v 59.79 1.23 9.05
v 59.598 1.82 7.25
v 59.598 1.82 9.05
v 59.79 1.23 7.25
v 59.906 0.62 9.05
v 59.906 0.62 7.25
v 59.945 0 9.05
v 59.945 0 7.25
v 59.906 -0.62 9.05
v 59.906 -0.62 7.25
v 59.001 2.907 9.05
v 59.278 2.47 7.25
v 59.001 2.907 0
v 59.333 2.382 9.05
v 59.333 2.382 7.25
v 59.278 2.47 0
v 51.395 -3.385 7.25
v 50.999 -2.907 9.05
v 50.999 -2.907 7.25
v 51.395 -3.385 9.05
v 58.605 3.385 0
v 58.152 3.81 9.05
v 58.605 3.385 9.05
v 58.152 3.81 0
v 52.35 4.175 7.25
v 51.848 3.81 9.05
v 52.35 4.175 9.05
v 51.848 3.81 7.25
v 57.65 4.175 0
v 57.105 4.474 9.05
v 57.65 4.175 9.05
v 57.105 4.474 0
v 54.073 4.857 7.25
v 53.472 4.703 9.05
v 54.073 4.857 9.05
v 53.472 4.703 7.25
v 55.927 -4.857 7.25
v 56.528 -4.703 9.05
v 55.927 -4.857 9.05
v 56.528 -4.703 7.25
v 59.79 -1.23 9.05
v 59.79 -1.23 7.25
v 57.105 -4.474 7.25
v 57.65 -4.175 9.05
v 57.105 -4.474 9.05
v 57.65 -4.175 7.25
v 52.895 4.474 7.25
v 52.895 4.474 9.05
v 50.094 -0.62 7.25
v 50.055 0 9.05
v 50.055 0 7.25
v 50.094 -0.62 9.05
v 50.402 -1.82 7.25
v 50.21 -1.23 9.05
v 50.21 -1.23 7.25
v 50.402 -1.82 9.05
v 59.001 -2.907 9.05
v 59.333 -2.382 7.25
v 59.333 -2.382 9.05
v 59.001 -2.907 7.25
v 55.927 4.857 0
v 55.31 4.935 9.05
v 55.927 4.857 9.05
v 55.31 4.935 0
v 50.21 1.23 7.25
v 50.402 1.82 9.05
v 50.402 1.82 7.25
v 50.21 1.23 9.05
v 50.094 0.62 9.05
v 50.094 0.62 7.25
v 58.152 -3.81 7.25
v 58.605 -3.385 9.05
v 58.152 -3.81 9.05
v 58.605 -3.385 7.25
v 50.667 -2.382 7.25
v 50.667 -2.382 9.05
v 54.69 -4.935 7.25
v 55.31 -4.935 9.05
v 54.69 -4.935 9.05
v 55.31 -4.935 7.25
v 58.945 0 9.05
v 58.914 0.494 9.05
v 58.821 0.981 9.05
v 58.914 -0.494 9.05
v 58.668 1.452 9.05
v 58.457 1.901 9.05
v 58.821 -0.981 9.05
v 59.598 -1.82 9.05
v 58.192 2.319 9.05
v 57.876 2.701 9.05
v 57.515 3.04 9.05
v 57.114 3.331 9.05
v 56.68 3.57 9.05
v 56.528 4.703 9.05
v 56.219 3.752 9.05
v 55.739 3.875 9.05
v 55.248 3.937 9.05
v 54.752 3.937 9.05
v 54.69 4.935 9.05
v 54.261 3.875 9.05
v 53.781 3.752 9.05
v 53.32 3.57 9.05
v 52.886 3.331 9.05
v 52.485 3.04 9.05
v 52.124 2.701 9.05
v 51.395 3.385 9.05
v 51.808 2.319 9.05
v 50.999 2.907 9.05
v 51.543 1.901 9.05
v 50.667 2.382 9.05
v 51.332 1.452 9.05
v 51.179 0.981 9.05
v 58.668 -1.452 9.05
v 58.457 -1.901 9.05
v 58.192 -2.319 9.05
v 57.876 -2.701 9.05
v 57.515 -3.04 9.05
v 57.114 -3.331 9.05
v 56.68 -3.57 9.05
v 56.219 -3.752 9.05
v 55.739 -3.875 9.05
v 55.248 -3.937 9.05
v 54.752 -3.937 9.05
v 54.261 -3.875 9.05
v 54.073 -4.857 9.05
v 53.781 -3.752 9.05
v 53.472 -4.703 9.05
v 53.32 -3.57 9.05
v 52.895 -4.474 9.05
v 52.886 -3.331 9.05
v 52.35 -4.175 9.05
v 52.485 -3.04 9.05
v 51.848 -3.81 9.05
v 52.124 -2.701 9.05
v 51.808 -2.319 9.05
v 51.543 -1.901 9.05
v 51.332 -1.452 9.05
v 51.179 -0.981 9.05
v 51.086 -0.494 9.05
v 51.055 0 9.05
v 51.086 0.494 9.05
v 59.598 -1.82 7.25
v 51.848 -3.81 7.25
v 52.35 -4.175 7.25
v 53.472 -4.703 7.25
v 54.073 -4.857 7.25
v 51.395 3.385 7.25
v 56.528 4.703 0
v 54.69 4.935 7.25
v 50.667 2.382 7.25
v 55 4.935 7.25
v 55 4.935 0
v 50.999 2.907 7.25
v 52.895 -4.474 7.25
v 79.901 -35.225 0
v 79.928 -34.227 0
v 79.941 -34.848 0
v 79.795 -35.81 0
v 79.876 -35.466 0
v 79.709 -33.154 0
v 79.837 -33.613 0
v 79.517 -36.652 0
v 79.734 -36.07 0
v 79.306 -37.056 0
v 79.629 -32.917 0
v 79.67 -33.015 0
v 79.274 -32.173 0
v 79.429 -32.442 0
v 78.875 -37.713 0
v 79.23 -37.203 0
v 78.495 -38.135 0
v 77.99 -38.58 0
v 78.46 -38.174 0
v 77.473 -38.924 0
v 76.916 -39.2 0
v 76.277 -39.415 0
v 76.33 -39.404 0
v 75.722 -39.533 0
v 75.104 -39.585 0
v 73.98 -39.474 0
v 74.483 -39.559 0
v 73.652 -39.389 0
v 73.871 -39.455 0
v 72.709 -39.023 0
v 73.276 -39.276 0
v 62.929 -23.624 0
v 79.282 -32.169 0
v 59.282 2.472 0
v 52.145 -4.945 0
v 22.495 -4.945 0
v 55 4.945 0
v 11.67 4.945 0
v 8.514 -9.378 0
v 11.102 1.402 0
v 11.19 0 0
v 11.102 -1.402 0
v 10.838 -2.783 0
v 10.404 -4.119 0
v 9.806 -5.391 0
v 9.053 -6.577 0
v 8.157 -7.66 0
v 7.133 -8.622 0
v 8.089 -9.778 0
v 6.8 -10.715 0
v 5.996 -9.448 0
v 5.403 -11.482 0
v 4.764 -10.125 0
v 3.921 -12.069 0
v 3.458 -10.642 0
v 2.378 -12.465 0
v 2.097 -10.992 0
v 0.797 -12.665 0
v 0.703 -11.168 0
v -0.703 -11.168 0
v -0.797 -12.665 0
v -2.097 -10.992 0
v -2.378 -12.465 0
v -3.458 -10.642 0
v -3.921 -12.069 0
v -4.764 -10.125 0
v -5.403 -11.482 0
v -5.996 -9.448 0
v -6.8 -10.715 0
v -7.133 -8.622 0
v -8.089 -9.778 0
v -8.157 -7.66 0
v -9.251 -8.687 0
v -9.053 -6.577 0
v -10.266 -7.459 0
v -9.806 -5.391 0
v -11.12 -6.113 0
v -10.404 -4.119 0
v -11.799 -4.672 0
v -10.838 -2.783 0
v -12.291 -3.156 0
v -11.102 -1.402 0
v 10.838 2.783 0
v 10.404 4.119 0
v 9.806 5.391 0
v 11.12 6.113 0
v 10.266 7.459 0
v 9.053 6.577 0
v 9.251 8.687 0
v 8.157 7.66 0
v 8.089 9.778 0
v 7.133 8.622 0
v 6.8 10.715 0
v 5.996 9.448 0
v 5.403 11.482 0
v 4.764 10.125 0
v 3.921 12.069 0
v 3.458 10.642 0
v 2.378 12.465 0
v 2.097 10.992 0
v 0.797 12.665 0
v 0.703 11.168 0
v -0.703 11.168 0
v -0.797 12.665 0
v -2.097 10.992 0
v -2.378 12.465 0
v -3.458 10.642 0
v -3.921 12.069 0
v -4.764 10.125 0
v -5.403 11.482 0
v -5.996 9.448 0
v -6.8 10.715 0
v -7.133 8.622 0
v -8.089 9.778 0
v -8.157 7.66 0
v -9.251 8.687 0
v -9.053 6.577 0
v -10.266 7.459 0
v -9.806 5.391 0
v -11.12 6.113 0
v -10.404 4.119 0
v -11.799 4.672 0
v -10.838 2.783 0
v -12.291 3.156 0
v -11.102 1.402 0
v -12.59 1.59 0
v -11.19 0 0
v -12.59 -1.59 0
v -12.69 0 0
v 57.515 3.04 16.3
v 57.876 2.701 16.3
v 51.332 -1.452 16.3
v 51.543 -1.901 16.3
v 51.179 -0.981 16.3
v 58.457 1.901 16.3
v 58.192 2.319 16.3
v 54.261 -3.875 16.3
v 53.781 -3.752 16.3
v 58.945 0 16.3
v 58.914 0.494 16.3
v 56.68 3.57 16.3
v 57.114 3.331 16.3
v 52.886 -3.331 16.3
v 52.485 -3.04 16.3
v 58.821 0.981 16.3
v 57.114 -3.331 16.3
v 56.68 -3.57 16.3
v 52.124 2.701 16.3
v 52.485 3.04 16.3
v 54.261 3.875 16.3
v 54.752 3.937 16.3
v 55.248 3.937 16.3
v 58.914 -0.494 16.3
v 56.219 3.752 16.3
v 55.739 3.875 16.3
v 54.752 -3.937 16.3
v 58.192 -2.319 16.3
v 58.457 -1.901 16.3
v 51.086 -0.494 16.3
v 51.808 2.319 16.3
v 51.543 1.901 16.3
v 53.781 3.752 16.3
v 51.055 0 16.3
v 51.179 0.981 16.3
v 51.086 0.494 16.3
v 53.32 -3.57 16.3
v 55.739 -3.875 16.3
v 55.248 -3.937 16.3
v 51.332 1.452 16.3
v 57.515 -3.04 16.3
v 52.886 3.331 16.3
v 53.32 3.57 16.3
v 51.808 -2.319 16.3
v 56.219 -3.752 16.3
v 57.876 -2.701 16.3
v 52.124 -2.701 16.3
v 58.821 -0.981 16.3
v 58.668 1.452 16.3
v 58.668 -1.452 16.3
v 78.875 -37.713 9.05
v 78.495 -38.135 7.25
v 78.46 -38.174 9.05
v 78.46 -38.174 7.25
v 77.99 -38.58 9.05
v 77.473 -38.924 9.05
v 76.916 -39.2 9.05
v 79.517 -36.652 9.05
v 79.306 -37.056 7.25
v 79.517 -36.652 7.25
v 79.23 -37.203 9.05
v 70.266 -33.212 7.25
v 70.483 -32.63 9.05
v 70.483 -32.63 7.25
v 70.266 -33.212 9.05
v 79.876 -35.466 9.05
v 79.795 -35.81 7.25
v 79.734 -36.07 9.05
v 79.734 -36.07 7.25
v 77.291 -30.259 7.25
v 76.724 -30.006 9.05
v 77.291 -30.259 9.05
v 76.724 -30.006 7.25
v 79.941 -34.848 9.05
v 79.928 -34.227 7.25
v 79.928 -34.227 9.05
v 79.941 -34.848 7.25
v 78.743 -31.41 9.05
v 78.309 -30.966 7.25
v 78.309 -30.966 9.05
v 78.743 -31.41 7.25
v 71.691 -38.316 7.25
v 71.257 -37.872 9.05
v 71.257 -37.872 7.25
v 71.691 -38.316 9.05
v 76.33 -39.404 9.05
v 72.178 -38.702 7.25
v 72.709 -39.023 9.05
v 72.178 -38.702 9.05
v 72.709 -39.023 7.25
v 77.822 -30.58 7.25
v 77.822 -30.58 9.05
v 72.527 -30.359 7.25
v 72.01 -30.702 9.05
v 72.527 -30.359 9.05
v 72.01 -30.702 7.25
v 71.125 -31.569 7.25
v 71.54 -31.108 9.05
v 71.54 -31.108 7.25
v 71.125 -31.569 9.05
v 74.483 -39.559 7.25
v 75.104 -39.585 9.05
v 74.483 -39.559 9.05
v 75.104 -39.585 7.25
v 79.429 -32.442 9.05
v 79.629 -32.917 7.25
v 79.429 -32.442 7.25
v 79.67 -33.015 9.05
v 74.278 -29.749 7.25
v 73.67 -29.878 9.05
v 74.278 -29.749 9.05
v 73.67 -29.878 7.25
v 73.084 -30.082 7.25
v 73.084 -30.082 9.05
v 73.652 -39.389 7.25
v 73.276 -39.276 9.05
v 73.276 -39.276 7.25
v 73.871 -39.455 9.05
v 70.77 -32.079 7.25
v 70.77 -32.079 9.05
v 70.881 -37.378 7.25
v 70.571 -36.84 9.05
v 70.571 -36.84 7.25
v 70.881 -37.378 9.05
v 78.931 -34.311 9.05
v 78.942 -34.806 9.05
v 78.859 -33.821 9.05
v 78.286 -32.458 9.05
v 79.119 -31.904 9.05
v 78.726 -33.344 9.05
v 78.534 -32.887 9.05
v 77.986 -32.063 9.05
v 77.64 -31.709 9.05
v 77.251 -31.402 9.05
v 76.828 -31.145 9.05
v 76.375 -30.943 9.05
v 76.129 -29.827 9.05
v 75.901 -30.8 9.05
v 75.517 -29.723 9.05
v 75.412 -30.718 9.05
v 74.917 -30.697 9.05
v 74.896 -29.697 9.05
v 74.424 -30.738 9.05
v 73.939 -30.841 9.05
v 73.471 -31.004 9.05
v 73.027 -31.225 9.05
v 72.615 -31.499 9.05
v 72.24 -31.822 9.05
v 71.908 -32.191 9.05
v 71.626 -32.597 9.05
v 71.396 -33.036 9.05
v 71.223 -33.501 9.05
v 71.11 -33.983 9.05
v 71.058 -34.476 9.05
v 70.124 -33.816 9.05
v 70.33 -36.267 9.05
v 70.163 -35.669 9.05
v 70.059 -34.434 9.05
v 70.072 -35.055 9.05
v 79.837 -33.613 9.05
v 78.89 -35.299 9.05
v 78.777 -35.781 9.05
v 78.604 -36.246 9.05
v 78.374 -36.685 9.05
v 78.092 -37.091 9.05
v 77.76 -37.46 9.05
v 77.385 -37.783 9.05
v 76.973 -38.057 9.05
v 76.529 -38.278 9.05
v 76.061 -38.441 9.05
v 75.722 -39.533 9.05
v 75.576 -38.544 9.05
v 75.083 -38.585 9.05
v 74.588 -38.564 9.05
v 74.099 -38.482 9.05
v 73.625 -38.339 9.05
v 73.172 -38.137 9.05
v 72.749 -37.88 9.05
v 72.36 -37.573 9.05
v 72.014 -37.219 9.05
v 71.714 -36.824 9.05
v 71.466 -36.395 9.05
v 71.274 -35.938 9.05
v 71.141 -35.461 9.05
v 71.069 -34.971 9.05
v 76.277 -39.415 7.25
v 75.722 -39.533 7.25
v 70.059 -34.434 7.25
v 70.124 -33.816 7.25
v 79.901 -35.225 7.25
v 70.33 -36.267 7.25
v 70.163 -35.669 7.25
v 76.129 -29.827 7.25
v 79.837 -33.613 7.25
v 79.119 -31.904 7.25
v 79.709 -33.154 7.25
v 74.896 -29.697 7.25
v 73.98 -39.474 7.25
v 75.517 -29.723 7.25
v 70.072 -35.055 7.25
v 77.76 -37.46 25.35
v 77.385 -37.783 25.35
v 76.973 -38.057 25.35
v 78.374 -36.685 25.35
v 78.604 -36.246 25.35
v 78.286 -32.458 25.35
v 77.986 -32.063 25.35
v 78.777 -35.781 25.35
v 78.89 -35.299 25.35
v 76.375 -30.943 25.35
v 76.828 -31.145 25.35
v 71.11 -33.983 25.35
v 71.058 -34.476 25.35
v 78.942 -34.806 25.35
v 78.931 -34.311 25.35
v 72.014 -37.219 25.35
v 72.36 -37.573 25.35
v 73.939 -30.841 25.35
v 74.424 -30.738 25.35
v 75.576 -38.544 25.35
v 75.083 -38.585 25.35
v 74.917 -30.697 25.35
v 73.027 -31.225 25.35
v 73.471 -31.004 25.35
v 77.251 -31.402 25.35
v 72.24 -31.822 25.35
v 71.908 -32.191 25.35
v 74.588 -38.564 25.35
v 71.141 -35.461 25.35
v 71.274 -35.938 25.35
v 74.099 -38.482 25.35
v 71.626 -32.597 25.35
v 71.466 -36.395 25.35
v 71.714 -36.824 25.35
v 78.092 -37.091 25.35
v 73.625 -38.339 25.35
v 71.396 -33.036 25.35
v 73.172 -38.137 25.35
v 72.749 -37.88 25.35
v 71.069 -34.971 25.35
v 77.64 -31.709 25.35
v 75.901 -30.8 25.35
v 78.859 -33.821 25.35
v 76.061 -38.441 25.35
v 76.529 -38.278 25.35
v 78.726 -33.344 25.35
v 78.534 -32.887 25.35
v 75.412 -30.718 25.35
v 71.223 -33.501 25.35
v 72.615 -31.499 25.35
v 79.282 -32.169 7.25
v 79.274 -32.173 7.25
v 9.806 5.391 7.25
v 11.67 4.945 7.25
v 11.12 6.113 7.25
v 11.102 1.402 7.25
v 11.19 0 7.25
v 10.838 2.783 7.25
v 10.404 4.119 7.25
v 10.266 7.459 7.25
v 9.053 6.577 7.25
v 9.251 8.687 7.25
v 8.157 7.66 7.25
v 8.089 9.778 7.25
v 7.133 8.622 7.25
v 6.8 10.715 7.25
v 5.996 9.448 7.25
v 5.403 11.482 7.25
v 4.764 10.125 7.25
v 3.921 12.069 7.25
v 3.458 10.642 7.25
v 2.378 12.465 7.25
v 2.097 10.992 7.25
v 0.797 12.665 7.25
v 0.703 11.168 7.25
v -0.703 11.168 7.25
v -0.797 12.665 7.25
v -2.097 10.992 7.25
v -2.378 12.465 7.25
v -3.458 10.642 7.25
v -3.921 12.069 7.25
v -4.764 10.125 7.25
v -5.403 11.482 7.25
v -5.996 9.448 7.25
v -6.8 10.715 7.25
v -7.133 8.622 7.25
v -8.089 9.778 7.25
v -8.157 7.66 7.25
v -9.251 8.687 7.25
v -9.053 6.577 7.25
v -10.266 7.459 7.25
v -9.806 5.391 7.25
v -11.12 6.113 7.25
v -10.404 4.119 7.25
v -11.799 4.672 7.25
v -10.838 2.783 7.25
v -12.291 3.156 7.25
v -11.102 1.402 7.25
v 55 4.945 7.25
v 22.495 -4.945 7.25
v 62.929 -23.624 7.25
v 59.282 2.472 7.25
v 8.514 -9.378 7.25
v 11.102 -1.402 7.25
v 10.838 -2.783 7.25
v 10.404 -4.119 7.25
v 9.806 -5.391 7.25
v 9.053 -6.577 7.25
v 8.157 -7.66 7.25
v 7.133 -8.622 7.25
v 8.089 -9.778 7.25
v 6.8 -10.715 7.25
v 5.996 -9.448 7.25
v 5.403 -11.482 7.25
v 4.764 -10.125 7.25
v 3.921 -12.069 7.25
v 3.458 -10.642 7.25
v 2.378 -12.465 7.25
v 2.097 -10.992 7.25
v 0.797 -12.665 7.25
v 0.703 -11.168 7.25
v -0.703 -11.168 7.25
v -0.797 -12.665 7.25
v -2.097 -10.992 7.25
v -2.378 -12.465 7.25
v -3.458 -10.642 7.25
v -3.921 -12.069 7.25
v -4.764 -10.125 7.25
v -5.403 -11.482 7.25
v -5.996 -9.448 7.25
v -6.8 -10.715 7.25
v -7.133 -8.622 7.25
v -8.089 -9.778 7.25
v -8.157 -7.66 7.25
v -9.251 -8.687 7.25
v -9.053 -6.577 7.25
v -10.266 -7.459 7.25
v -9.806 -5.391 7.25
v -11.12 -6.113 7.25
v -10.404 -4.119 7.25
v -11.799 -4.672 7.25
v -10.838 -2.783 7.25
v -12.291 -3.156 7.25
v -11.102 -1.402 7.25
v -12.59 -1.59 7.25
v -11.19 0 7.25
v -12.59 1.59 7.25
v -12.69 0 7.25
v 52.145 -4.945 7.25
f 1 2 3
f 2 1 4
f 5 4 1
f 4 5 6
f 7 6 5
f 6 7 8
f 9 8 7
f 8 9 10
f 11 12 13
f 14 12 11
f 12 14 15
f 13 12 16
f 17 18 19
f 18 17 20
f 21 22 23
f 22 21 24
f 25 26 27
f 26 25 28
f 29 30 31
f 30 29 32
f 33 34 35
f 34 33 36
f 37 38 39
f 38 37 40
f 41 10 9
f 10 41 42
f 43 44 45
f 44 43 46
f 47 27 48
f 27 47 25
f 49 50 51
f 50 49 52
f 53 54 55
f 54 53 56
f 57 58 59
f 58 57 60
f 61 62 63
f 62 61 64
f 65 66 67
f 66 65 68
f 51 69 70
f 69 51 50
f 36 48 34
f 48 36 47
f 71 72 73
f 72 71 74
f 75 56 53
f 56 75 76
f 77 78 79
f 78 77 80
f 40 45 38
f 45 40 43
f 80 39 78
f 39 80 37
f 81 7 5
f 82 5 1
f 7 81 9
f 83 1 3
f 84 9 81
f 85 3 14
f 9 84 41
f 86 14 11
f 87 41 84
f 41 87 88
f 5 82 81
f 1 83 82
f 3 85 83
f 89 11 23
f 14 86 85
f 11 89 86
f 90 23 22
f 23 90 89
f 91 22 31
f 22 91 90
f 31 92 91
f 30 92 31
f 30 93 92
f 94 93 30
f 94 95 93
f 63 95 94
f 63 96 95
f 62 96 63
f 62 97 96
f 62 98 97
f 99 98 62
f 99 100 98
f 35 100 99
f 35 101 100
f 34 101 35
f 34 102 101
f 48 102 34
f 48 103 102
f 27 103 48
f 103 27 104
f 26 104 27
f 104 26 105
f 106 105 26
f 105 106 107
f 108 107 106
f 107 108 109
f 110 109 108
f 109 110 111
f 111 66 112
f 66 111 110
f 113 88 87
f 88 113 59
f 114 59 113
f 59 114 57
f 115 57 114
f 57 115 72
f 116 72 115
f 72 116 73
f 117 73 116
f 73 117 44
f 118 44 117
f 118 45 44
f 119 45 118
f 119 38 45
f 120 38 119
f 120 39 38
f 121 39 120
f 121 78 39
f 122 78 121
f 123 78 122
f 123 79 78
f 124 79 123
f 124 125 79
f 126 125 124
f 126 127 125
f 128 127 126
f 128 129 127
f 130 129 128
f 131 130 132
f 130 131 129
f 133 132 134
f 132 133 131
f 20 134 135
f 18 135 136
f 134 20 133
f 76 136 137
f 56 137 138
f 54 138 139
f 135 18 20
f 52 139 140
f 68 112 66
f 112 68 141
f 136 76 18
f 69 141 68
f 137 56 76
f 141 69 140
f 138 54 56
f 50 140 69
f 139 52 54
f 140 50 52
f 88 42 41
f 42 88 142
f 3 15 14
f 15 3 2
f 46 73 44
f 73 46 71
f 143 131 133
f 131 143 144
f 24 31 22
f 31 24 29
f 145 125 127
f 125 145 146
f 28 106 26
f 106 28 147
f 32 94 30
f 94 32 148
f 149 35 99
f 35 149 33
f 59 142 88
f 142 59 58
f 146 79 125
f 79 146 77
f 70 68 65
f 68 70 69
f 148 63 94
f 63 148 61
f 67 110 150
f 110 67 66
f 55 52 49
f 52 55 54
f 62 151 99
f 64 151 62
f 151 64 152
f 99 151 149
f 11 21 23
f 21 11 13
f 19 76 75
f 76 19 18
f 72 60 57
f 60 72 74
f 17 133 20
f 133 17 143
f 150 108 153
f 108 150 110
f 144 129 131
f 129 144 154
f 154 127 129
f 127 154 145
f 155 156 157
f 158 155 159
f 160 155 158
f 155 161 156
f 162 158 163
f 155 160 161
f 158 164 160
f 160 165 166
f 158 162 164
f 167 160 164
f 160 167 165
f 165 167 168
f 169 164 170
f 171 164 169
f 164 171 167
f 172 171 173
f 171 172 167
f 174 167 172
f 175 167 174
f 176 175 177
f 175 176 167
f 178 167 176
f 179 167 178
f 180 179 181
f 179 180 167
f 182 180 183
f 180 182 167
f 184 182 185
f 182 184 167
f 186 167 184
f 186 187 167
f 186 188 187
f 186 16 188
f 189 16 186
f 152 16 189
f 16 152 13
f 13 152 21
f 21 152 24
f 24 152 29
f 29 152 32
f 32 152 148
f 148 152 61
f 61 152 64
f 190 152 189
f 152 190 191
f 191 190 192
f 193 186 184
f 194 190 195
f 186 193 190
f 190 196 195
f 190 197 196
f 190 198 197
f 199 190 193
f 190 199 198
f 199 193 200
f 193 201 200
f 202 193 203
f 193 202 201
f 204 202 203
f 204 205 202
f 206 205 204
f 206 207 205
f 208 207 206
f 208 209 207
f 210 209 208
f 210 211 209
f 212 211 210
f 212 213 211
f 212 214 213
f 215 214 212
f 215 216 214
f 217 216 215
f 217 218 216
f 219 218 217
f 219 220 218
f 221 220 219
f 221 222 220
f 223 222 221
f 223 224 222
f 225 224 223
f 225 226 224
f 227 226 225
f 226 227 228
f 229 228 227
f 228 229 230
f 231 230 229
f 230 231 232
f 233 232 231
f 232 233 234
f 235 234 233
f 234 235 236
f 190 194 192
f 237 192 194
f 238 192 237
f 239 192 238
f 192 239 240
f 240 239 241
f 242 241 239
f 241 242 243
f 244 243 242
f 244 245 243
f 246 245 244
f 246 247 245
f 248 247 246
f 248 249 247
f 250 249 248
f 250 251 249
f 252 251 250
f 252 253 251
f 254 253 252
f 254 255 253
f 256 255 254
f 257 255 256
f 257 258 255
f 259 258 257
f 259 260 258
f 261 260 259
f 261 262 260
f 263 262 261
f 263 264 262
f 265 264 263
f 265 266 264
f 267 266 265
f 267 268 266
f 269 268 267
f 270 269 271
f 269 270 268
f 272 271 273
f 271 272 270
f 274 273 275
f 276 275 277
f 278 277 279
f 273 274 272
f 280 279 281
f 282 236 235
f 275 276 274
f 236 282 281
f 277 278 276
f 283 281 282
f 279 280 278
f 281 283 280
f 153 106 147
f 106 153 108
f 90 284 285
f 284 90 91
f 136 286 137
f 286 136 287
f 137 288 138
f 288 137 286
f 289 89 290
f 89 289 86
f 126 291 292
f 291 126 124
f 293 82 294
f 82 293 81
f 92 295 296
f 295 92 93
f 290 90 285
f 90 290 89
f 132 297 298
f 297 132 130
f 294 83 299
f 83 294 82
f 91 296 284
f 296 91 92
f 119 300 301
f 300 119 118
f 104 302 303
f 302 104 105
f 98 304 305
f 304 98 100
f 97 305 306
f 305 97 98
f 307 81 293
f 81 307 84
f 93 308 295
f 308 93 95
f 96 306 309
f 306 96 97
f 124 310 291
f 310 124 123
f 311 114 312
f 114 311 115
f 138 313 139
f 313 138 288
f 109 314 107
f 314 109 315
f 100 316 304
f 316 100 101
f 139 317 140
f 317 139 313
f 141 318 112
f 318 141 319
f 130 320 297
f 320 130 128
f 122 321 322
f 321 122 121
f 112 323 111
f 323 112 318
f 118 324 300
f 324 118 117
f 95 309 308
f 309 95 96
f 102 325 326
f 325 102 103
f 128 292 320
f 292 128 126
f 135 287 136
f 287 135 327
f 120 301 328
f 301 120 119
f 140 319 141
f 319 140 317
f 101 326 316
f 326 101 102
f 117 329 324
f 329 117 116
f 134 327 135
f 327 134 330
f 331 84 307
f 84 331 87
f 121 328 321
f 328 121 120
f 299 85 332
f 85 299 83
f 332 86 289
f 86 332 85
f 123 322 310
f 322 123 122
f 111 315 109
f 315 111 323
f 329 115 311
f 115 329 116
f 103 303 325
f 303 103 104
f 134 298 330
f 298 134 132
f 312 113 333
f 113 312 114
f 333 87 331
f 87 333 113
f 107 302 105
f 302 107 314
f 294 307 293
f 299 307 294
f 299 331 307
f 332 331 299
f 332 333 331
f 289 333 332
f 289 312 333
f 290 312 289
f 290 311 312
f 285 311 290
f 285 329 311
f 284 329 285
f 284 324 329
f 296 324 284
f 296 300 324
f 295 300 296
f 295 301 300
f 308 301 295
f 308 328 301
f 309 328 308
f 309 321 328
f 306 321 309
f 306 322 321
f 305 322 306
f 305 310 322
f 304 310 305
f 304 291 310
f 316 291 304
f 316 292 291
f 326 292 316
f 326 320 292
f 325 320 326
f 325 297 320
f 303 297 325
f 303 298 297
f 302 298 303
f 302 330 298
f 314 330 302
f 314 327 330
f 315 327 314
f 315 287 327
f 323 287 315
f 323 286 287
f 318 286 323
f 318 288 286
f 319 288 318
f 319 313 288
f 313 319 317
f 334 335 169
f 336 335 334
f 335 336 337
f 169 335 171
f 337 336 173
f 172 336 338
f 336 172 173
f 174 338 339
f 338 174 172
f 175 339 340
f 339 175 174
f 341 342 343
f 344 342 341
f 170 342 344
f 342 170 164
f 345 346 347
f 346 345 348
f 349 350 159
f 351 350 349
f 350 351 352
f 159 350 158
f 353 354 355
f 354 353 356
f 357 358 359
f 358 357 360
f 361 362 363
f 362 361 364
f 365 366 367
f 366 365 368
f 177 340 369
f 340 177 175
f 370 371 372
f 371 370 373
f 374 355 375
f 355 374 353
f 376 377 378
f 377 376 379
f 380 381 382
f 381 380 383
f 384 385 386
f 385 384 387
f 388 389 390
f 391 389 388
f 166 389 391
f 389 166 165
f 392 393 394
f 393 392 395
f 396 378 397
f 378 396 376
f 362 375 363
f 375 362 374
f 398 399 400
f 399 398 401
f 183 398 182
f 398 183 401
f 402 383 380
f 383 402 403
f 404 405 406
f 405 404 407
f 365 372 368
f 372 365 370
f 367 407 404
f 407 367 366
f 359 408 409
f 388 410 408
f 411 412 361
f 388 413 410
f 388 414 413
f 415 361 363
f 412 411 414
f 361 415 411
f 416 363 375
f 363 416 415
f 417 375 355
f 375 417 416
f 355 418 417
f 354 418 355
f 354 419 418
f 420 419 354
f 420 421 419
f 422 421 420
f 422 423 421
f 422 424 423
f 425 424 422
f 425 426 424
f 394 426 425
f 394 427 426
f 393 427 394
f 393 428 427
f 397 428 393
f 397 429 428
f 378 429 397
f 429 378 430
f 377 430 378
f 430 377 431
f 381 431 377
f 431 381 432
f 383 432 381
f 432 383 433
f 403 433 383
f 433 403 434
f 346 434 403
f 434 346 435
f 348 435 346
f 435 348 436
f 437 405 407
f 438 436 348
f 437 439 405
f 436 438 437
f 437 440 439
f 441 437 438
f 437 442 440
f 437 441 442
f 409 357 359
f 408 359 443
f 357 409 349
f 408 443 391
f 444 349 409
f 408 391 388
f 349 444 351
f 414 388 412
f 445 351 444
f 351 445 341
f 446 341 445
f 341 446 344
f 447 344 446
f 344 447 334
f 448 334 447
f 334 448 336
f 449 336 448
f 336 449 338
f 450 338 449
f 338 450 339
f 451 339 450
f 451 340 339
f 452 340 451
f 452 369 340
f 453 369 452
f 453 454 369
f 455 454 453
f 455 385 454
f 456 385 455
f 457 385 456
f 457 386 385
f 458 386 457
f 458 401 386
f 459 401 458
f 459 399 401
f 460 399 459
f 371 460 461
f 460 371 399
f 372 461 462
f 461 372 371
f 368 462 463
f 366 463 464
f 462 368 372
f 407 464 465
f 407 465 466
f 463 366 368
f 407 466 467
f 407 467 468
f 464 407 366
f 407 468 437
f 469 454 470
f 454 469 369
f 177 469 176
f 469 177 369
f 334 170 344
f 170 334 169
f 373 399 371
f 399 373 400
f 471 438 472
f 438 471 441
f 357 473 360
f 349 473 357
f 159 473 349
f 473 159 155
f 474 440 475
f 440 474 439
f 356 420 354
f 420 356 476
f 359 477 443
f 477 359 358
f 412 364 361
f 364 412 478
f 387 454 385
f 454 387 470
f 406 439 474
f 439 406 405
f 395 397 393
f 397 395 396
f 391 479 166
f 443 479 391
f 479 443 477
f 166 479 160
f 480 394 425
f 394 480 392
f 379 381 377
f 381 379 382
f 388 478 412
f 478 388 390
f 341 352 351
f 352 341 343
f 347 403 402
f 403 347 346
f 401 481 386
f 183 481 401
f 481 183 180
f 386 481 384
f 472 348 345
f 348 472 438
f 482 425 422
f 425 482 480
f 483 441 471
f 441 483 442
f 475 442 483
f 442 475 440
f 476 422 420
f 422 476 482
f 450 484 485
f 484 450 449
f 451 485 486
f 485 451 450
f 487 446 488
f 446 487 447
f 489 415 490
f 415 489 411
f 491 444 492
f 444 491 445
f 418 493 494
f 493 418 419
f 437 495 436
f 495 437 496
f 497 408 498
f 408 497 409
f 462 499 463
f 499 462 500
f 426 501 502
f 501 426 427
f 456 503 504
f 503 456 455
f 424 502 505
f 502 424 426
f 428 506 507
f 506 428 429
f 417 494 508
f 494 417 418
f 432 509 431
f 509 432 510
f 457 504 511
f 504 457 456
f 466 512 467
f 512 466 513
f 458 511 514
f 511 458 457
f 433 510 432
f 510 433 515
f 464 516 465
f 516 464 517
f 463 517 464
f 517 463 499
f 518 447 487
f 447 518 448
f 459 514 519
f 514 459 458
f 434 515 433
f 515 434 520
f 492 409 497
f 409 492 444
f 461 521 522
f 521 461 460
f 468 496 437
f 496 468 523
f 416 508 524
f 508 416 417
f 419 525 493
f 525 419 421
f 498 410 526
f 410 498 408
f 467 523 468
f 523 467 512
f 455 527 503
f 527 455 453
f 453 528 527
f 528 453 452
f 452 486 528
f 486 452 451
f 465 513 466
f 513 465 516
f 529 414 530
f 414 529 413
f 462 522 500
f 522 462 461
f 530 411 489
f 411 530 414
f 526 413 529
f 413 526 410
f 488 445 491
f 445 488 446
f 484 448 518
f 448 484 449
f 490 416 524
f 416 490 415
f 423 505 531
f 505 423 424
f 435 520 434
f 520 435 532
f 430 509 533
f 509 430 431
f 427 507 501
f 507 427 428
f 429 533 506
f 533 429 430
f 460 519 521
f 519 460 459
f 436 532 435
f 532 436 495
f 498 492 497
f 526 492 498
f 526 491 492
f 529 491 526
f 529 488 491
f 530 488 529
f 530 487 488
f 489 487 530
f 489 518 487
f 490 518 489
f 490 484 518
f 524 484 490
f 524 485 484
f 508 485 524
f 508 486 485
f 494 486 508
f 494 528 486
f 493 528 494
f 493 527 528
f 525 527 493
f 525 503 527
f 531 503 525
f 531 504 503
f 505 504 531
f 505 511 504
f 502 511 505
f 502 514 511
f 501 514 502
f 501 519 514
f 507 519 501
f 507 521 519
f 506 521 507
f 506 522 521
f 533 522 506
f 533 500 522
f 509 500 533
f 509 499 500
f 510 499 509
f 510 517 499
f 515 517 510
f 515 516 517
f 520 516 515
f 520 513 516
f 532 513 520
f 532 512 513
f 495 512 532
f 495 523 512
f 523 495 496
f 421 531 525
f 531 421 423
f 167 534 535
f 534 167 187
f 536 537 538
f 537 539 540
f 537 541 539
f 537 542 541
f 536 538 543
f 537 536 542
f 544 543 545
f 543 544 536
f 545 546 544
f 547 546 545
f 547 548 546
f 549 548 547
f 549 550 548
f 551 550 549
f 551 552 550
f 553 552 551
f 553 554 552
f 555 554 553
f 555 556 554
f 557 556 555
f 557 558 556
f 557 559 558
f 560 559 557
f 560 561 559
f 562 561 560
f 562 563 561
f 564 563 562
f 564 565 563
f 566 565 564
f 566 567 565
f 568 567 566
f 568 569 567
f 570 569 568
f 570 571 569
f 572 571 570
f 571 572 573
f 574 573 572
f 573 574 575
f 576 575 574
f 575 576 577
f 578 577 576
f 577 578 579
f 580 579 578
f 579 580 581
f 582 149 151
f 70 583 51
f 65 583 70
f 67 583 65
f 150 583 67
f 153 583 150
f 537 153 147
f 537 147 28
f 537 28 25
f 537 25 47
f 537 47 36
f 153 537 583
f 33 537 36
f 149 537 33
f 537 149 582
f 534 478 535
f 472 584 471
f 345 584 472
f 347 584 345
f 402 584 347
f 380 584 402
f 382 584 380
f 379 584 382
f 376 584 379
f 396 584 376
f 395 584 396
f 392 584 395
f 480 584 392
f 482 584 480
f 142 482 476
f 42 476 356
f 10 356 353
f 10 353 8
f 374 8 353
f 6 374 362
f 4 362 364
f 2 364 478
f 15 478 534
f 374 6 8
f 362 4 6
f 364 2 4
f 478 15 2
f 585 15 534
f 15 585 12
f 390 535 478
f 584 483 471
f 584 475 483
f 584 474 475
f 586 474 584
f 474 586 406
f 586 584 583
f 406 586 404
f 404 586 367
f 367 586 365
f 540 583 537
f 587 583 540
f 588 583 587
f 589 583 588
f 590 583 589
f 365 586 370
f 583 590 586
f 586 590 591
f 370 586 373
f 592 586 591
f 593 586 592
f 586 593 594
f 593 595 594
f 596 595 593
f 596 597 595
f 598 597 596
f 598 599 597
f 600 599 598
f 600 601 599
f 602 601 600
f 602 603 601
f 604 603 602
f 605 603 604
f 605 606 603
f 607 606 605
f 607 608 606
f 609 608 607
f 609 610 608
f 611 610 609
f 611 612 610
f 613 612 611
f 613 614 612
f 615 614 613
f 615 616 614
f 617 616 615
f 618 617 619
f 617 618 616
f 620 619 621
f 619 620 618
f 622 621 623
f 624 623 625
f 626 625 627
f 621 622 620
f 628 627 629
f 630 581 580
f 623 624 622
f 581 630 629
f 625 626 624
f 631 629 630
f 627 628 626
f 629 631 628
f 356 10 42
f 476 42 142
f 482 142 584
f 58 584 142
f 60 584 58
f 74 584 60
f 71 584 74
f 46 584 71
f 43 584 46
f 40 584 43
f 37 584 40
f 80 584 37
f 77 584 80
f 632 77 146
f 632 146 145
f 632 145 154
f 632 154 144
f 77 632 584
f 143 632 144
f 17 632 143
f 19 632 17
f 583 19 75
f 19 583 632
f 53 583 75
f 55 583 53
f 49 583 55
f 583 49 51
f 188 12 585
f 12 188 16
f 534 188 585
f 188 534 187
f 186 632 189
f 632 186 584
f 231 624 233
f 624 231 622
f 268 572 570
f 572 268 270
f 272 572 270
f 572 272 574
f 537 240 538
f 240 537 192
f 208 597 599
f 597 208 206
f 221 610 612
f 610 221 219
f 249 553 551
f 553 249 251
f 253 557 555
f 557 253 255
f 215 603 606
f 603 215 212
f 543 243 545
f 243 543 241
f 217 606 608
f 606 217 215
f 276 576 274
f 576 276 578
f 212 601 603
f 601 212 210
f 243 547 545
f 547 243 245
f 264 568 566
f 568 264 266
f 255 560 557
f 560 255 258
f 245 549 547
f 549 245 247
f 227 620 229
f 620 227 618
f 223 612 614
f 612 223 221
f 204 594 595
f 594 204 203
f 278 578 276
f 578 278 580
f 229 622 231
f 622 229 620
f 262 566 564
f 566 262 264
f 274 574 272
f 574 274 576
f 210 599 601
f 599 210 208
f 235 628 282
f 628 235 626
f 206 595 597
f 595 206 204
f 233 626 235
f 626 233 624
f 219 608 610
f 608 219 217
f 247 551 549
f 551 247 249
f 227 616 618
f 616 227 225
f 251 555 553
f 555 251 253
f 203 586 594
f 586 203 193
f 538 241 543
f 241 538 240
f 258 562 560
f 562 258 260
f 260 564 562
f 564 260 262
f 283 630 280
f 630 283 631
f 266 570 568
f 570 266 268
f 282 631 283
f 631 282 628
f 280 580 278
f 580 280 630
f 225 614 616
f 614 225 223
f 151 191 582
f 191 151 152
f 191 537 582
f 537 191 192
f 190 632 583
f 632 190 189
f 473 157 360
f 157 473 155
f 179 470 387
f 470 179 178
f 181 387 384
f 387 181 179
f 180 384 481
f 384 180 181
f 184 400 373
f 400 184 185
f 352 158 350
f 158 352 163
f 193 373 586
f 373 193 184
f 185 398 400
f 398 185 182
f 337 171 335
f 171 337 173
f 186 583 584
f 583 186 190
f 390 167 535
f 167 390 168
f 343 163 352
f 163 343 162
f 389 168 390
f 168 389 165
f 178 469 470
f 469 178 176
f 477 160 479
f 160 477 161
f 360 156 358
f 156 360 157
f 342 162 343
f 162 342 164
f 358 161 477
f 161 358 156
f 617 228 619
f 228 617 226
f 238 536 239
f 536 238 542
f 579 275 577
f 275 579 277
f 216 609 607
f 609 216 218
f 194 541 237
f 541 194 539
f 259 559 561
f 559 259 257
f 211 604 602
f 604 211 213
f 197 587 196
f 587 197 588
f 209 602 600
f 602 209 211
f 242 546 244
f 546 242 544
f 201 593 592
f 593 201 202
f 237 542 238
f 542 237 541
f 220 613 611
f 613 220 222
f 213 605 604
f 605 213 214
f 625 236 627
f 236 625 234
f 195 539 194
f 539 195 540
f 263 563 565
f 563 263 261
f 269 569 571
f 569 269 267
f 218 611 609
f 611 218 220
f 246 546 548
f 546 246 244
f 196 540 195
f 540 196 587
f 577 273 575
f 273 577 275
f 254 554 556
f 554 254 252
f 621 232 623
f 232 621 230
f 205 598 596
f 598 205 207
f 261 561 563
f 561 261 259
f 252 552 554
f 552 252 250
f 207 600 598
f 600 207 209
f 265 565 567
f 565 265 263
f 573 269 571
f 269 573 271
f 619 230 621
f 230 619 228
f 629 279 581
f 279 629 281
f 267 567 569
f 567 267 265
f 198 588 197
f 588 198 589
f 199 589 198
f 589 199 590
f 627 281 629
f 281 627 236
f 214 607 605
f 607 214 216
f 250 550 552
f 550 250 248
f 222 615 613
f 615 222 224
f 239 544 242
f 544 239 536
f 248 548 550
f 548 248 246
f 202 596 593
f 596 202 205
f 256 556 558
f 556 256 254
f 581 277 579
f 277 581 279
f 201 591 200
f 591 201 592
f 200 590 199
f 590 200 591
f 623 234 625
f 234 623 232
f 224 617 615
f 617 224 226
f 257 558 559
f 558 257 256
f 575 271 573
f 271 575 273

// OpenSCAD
bearing_height = 7.25;
bearing_outer_diameter = 22.38;
bearing_inner_diameter = 7.89;
link_length = 55;
end_effector_angle = -60;
end_effector_length = 40;
num_layers = 1;
end_effector_layers = 2;
$fn = 50;

module press_fit_link(
  bearing_height,
  bearing_outer_diameter,
  bearing_inner_diameter,
  link_length,
  end_effector_angle,
  end_effector_length,
  outer_diameter_margin=3,
  inner_diameter_margin=2,
  link_layer_margin=1.8,
  num_layers=1, /* zero turns it into an outter bearing */
  end_effector_layers=0, /* TODO: implement 0 */
) {
  link_width = bearing_inner_diameter + inner_diameter_margin;

  layer_height = bearing_height + link_layer_margin;

  module outter_bearing_inside() {
    cylinder(h=bearing_height + 100, d=bearing_outer_diameter);
  }

  module outter_bearing_outside() {
    cylinder(h=bearing_height, d=bearing_outer_diameter + outer_diameter_margin);
  }

  module inner_bearing_positive(num_layers) {
    if (num_layers > 0) {
      // inner base and tower
      cylinder(h=bearing_height + link_layer_margin, d=link_width);
      cylinder(
        h=bearing_height * 2 + link_layer_margin + (num_layers - 1) * layer_height,
        d=bearing_inner_diameter
      );

      // inner spacers
      if (num_layers > 1) {
        %translate([0, 0, bearing_height])
        for (i = [0: num_layers - 2]) {
          translate([0, 0, (i + 1) * (bearing_height + link_layer_margin)])
          cylinder(h=link_layer_margin, d=link_width);
        }
      }
    }
  }

  module negative() {
    translate([0, 0, -1]) {
      outter_bearing_inside();

      if (num_layers == 0) {
        translate([link_length, 0, 0])
        outter_bearing_inside();
      }
    }
  }

  module positive() {
    // outter 1
    outter_bearing_outside();

    // link from 1 to 2
    translate([0, -link_width / 2, 0])
    cube([link_length, link_width, bearing_height]);

    // inner or outter 2
    translate([link_length, 0, 0]) {
      if (num_layers == 0) {
        // 0 -> outter 2
        outter_bearing_outside();
      } else if (num_layers > 0) {
        // >0 -> inner 2
        inner_bearing_positive(num_layers);
      }
    }

    // end effector (from 2 to 3)
    translate([link_length, 0, 0])
    rotate([0, 0, end_effector_angle]) {
      translate([0, -link_width / 2, 0])
      cube([end_effector_length, link_width, bearing_height]);

      translate([end_effector_length, 0, 0]) {
        cylinder(h=bearing_height, d=link_width);
        inner_bearing_positive(end_effector_layers);
      }
    }

    // link from 1 to 3
    hull() {
      cylinder(h=bearing_height, d=link_width);
      translate([link_length, 0, 0])
      rotate([0, 0, end_effector_angle])
      translate([end_effector_length, 0, 0])
      cylinder(h=bearing_height, d=link_width);
    }
  }

  difference() {
    positive();
    negative();
  }
}

module spacer(
  bearing_height,
  bearing_outer_diameter,
  bearing_inner_diameter,
  link_length,
  end_effector_angle,
  end_effector_length,
  outer_diameter_margin=3,
  inner_diameter_margin=2,
  link_layer_margin=1.8,
  num_layers=1, /* zero turns it into an outter bearing */
  end_effector_layers=0, /* TODO: implement 0 */
) {
  link_width = bearing_inner_diameter + inner_diameter_margin;
  difference() {
    cylinder(h=link_layer_margin, d=link_width);
    cylinder(h=100, d=bearing_inner_diameter, center=true);
  }
}

press_fit_link(
  bearing_height=bearing_height,
  bearing_outer_diameter=bearing_outer_diameter,
  bearing_inner_diameter=bearing_inner_diameter,
  link_length=link_length,
  num_layers=num_layers,
  end_effector_layers=end_effector_layers,
  end_effector_angle=end_effector_angle,
  end_effector_length=end_effector_length
);
